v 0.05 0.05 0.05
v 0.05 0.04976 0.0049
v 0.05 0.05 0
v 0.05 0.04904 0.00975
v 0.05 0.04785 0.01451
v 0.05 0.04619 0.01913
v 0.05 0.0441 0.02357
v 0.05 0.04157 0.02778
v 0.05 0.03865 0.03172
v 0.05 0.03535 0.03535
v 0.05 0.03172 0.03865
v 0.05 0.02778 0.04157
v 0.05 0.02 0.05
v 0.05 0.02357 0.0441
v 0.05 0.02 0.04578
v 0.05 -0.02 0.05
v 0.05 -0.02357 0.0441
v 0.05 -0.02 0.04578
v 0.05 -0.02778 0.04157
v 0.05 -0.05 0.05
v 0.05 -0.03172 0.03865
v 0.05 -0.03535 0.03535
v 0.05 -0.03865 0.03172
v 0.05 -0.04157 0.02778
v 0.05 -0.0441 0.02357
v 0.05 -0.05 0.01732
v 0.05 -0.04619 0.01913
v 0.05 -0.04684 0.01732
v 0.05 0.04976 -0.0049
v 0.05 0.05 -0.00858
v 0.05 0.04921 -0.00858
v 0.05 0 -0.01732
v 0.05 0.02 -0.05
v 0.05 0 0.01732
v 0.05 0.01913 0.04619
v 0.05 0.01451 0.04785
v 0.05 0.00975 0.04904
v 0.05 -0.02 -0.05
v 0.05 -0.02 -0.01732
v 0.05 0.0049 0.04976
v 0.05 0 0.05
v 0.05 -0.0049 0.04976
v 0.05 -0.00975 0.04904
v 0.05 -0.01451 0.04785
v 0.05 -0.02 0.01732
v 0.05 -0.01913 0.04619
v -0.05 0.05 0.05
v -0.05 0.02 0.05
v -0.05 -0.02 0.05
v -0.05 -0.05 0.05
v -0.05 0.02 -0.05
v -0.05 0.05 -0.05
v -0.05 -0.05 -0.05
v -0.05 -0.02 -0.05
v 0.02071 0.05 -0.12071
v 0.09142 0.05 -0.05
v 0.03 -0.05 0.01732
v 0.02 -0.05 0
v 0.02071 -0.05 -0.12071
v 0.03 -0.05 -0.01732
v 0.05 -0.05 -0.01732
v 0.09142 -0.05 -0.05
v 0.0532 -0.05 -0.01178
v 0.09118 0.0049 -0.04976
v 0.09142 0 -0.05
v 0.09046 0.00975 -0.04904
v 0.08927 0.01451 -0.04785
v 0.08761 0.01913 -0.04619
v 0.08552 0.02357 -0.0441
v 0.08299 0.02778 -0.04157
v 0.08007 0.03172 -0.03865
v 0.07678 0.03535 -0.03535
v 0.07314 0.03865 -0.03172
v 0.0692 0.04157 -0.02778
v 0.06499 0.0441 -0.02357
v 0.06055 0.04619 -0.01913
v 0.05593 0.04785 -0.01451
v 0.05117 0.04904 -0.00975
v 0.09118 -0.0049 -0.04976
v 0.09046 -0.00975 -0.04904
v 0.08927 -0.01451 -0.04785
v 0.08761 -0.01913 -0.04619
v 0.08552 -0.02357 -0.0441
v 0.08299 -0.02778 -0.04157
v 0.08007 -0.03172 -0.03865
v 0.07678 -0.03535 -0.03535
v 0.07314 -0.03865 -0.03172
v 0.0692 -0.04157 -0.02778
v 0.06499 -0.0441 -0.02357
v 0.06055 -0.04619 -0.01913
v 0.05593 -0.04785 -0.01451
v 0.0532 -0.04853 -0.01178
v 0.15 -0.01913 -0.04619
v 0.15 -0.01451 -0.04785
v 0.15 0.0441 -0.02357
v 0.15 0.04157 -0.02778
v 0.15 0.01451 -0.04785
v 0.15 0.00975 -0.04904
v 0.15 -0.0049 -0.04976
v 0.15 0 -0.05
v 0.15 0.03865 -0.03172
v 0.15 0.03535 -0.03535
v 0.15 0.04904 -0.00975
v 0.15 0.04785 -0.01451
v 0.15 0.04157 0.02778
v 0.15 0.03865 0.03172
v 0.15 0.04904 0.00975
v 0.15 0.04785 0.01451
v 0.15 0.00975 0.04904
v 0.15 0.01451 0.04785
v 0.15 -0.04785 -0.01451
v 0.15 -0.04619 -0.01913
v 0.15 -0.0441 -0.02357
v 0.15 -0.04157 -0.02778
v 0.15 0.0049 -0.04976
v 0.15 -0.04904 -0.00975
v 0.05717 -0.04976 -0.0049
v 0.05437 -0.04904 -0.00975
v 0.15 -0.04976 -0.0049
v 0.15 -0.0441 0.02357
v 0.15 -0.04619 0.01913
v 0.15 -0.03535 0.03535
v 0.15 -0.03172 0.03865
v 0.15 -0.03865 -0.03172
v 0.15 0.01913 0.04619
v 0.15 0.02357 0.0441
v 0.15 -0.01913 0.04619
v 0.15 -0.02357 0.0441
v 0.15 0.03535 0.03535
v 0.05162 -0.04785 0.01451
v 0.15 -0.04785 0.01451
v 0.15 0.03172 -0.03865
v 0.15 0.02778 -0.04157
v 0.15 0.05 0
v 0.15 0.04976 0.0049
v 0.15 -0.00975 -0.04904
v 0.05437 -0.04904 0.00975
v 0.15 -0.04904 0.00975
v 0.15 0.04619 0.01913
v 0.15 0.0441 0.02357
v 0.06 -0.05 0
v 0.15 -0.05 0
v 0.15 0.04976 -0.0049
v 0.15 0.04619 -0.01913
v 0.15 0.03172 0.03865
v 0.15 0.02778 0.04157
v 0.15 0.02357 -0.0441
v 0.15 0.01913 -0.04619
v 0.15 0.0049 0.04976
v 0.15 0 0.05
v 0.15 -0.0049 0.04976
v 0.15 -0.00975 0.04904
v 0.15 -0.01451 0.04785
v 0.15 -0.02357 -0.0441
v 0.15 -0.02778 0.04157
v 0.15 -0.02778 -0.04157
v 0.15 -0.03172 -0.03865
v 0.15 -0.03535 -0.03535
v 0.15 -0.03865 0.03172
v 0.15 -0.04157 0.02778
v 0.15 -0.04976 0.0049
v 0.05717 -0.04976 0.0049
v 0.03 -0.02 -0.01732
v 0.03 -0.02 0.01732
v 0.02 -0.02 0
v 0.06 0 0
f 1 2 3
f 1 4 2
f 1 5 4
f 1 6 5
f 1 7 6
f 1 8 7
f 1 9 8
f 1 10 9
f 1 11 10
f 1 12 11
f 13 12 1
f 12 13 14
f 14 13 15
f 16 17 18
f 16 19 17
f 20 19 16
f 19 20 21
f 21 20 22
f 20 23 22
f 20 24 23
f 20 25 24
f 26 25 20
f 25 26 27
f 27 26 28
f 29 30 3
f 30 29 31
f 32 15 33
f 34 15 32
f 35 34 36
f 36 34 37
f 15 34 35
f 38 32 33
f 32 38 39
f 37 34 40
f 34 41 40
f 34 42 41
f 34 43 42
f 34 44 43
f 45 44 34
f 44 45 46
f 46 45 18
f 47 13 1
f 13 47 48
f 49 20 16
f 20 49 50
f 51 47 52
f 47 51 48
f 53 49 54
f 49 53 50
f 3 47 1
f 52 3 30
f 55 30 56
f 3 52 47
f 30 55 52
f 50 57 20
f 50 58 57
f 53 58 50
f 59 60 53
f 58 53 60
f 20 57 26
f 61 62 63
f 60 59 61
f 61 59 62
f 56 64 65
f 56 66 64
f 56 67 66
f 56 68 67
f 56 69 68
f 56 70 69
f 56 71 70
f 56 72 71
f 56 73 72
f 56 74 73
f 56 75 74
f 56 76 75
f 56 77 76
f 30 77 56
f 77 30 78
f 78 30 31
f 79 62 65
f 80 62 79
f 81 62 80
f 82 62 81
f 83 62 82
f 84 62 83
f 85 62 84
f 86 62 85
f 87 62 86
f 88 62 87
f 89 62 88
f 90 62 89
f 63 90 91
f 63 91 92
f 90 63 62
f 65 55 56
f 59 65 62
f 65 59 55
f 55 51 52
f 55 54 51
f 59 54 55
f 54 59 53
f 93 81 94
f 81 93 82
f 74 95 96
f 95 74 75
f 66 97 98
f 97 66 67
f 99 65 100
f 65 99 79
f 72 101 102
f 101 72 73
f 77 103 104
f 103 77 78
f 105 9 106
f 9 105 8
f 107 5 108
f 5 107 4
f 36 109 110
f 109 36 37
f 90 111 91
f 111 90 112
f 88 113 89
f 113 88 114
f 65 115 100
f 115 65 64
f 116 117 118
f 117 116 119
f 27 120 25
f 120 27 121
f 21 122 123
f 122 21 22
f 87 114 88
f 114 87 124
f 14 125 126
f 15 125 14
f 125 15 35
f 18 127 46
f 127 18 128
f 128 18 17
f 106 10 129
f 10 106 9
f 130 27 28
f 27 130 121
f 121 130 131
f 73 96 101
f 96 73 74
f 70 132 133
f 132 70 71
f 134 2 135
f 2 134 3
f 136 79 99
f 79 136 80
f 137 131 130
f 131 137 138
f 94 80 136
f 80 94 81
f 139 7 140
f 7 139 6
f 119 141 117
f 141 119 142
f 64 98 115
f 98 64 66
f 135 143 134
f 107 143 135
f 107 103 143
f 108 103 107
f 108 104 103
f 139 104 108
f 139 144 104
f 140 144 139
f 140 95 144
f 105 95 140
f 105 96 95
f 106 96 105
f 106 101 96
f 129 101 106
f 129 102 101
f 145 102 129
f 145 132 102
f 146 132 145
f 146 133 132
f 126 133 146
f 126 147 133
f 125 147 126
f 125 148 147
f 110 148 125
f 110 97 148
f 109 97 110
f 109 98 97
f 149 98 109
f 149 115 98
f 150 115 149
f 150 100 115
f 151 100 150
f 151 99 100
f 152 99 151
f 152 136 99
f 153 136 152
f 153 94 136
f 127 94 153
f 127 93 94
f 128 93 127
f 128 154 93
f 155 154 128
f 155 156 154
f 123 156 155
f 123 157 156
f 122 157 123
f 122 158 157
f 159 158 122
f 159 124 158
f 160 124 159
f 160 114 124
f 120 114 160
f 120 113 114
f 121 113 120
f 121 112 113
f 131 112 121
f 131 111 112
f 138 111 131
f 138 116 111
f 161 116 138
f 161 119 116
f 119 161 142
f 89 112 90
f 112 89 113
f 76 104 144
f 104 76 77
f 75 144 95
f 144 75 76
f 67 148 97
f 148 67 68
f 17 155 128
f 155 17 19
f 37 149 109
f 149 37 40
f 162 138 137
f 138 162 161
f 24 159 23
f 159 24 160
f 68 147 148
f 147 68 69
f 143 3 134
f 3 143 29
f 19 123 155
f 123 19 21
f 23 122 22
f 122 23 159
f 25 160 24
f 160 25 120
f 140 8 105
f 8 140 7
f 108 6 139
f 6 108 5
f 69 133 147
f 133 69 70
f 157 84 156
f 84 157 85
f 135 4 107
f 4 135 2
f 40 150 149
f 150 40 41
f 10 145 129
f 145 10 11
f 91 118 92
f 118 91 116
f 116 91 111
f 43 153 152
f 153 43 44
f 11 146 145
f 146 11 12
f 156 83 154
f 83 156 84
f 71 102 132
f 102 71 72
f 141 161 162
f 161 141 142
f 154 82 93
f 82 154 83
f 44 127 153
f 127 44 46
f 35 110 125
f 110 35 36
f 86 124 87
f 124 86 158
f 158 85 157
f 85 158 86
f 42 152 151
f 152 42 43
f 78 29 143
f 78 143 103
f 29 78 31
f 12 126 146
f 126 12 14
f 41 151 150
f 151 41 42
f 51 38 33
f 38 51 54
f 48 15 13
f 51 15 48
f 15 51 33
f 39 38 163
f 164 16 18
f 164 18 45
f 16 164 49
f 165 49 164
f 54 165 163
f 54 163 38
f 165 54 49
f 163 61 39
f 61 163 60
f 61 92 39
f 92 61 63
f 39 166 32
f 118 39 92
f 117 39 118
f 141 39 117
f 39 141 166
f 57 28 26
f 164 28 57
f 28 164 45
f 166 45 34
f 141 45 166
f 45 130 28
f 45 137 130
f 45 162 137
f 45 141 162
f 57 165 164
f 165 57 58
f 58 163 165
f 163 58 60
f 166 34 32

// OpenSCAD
module u_shaped_bracket() {
    difference() {
        // Main prismatic body
        union() {
            // Base rectangular prism
            translate([-0.05, -0.05, -0.05])
                cube([0.1, 0.1, 0.1]);
            // Chamfered end
            translate([-0.05, -0.05, -0.05])
                rotate([0, 45, 0])
                cube([0.1, 0.1, 0.1]);
            // Rounded end
            translate([0.05, 0, 0])
                rotate([0, 90, 0])
                cylinder(h=0.1, r=0.05, $fn=64);
        }
        // Rectangular through-slot
        translate([-0.05, -0.02, -0.05])
            cube([0.1, 0.04, 0.1]);
        // Hexagonal through-hole
        translate([0.04, 0, 0])
            rotate([90, 0, 0])
            cylinder(h=0.1, r=0.02, $fn=6);
    }
}

u_shaped_bracket();
